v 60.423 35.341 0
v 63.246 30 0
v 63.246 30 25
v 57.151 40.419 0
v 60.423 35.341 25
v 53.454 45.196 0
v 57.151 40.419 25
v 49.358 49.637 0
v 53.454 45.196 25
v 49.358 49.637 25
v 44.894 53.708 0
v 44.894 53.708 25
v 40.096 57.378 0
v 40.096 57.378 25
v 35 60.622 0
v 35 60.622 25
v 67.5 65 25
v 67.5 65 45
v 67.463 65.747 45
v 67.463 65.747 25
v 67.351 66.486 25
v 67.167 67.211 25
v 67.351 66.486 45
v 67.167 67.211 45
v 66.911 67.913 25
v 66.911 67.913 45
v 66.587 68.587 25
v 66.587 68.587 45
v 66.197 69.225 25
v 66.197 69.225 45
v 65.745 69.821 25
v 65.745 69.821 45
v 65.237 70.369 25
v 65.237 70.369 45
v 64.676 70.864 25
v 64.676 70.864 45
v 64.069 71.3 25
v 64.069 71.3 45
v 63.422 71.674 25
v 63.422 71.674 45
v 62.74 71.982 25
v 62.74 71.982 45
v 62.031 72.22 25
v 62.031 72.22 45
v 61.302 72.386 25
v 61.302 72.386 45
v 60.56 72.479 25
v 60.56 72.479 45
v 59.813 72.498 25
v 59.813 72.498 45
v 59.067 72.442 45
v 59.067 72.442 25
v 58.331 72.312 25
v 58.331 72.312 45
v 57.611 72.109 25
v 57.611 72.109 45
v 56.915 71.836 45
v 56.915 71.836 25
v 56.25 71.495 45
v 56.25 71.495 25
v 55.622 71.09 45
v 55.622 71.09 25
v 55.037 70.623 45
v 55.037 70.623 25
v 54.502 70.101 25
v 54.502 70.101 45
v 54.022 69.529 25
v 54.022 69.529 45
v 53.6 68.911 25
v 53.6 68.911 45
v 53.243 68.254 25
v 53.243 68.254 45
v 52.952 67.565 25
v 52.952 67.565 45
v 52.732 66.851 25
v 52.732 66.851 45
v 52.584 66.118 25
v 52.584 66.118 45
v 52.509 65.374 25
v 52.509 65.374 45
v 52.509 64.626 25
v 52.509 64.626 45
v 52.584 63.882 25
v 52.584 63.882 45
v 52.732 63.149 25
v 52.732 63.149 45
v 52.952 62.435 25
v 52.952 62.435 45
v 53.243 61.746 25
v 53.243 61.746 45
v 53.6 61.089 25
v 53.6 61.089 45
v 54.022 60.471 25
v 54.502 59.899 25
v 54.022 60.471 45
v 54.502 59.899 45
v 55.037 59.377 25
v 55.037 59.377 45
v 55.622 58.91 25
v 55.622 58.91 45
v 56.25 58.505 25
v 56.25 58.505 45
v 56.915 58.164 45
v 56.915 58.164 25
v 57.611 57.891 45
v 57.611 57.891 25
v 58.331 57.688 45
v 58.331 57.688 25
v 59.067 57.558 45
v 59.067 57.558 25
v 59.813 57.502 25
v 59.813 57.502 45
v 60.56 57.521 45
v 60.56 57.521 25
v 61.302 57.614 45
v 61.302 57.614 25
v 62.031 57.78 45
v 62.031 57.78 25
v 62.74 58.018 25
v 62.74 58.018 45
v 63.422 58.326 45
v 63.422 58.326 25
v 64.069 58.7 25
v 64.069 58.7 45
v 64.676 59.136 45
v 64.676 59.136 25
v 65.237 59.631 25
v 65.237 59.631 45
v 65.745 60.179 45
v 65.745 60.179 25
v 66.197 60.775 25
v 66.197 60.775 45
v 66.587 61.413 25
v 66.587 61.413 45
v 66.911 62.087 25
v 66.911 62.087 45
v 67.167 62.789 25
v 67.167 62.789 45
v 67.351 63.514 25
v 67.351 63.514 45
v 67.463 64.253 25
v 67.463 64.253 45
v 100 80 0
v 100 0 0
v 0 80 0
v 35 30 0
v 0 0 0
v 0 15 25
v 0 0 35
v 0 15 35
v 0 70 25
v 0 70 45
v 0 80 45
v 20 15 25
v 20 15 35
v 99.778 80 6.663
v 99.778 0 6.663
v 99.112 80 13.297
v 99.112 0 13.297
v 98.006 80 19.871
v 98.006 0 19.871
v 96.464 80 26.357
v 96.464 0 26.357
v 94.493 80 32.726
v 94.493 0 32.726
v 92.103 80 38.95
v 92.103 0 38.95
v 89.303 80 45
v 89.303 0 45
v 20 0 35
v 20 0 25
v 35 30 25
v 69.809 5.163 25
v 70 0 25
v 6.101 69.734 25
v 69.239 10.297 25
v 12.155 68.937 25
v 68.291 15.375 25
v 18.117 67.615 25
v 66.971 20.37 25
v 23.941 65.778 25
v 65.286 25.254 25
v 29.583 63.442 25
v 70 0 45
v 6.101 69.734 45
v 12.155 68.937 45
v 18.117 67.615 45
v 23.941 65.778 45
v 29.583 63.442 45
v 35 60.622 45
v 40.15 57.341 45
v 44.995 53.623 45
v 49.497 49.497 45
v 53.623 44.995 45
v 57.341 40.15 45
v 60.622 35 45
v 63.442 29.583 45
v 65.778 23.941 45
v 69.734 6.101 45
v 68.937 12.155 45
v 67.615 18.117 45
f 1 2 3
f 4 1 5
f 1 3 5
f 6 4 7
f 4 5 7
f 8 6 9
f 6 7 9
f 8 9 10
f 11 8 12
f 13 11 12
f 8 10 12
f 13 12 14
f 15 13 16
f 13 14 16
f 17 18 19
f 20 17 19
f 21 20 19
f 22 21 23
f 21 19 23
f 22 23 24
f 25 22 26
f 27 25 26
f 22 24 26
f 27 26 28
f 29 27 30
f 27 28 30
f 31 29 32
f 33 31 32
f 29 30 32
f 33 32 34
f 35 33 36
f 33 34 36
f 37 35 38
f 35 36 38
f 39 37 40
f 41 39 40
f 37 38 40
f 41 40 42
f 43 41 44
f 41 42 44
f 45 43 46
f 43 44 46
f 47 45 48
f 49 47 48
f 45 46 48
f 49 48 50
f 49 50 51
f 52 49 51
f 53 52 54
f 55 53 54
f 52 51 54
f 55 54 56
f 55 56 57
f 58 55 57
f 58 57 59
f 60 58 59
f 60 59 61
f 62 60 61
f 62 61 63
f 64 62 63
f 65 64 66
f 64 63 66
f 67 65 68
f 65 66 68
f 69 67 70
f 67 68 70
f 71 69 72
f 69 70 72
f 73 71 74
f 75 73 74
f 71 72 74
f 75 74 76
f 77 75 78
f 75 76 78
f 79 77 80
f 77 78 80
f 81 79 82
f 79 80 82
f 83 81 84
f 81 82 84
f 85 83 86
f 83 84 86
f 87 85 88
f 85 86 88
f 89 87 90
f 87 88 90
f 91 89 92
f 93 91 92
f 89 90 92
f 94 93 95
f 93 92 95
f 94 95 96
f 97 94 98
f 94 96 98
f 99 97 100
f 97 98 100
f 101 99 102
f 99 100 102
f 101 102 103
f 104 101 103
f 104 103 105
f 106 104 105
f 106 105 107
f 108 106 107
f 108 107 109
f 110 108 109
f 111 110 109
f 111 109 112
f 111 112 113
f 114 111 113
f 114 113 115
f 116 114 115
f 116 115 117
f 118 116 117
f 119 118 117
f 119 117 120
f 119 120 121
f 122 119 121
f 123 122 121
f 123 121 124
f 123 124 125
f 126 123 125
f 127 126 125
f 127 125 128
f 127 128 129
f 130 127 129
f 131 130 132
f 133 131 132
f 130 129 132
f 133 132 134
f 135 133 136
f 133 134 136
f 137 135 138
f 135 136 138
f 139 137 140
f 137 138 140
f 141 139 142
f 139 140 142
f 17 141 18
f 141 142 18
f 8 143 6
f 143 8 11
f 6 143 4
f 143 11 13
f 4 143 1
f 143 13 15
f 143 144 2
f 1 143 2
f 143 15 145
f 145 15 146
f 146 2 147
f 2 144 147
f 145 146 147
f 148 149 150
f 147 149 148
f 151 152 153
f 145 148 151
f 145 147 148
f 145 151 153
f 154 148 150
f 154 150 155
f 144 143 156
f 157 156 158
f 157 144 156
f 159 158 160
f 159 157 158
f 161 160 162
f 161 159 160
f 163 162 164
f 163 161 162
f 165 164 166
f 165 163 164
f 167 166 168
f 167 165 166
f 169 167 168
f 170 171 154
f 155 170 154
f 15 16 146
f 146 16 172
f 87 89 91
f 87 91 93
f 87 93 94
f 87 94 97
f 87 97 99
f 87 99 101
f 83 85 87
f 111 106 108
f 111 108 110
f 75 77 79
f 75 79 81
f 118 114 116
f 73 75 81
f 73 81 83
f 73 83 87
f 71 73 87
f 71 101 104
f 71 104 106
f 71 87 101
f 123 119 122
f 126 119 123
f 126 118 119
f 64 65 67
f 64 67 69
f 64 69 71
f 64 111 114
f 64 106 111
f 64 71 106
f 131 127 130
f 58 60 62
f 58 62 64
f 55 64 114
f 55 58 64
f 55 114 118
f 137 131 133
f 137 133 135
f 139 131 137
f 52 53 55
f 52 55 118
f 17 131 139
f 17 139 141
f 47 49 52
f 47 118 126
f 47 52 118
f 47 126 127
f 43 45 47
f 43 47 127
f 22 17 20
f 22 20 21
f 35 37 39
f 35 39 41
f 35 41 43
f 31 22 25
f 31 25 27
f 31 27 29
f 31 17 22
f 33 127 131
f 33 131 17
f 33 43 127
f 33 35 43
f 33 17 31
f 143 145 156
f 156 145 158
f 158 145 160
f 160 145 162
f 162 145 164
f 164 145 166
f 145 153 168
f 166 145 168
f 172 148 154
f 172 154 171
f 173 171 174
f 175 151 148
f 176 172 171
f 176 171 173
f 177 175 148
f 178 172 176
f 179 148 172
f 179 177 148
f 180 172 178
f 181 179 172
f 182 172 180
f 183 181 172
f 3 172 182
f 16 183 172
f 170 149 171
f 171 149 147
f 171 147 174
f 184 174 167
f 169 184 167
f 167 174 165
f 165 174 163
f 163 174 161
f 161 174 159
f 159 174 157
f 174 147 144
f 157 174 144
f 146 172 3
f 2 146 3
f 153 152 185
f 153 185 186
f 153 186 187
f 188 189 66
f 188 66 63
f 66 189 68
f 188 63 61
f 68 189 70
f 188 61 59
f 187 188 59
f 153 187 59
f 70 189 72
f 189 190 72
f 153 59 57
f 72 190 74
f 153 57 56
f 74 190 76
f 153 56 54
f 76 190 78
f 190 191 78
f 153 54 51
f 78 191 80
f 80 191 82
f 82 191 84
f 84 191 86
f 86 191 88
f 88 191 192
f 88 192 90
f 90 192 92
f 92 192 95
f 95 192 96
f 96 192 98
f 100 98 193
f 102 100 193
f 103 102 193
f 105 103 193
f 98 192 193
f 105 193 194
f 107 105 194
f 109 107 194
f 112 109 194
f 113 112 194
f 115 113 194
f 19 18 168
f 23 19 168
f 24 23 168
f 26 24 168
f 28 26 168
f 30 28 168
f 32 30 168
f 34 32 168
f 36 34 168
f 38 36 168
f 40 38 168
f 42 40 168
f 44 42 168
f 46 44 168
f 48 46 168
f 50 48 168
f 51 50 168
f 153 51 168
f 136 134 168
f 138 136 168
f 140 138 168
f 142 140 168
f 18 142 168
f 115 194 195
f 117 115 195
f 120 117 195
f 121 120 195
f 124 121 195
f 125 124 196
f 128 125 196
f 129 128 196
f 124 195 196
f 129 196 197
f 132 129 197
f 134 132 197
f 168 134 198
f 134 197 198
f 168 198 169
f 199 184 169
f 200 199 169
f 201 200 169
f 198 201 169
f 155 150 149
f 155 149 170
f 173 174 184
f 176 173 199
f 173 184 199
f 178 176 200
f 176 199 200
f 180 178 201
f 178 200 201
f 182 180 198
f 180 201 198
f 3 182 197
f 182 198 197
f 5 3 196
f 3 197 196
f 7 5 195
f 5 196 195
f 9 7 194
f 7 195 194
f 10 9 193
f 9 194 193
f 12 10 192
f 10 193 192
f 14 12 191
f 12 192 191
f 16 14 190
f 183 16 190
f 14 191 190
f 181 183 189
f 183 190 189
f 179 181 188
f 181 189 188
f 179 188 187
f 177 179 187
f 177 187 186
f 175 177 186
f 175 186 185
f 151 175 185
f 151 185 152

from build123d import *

# Parameters (mm, degrees)
F0_R      = 100
F1_DEPTH  = 80
F3_DEPTH  = 80.001
F4_W      = 150.365841
F4_H      = 83.414628
F5_DEPTH  = 80.001
F6_R      = 7.5
F6_R_2    = 70
F7_DEPTH  = 20
F9_DEPTH  = 25.001
F10_W     = 20
F10_H     = 15
F11_DEPTH = 10


with BuildPart() as f1:
    # F0 (on Front) → F1 (new body)
    with BuildSketch(Plane.XZ):
        Circle(F0_R)
    extrude(amount=-F1_DEPTH)

    # F2 (on face) → F3 (cut, through all)
    with BuildSketch(Plane.XZ):
        with BuildLine():
            Line((0, 0), (0, 100))
            ThreePointArc((0, 100), (-70.710678, -70.710678), (100, 0))
            Line((100, 0), (0, 0))
        make_face()
    extrude(amount=-F3_DEPTH, mode=Mode.SUBTRACT)

    # F4 (on face) → F5 (cut, through all)
    with BuildSketch(Plane.XZ):
        with Locations((51.838493, 86.707314)):
            Rectangle(F4_W, F4_H)
    extrude(amount=-F5_DEPTH, mode=Mode.SUBTRACT)

    # F6 (on face) → F7 (cut)
    with BuildSketch(Plane.XY.offset(45)):
        with Locations((60, 65)):
            Circle(F6_R)
        Circle(F6_R_2)
    extrude(amount=-F7_DEPTH, mode=Mode.SUBTRACT)

    # F8 (on face) → F9 (cut, through all)
    with BuildSketch(Plane.XY.offset(25)):
        with BuildLine():
            ThreePointArc((63.245553, 30), (51.453576, 47.460821), (35, 60.621778))
            Line((35, 60.621778), (35, 30))
            Line((35, 30), (63.245553, 30))
        make_face()
    extrude(amount=-F9_DEPTH, mode=Mode.SUBTRACT)

    # F10 (on face) → F11 (join)
    with BuildSketch(Plane.XY.offset(25)):
        with Locations((10, 7.5)):
            Rectangle(F10_W, F10_H)
    extrude(amount=F11_DEPTH)


solid = f1.part
